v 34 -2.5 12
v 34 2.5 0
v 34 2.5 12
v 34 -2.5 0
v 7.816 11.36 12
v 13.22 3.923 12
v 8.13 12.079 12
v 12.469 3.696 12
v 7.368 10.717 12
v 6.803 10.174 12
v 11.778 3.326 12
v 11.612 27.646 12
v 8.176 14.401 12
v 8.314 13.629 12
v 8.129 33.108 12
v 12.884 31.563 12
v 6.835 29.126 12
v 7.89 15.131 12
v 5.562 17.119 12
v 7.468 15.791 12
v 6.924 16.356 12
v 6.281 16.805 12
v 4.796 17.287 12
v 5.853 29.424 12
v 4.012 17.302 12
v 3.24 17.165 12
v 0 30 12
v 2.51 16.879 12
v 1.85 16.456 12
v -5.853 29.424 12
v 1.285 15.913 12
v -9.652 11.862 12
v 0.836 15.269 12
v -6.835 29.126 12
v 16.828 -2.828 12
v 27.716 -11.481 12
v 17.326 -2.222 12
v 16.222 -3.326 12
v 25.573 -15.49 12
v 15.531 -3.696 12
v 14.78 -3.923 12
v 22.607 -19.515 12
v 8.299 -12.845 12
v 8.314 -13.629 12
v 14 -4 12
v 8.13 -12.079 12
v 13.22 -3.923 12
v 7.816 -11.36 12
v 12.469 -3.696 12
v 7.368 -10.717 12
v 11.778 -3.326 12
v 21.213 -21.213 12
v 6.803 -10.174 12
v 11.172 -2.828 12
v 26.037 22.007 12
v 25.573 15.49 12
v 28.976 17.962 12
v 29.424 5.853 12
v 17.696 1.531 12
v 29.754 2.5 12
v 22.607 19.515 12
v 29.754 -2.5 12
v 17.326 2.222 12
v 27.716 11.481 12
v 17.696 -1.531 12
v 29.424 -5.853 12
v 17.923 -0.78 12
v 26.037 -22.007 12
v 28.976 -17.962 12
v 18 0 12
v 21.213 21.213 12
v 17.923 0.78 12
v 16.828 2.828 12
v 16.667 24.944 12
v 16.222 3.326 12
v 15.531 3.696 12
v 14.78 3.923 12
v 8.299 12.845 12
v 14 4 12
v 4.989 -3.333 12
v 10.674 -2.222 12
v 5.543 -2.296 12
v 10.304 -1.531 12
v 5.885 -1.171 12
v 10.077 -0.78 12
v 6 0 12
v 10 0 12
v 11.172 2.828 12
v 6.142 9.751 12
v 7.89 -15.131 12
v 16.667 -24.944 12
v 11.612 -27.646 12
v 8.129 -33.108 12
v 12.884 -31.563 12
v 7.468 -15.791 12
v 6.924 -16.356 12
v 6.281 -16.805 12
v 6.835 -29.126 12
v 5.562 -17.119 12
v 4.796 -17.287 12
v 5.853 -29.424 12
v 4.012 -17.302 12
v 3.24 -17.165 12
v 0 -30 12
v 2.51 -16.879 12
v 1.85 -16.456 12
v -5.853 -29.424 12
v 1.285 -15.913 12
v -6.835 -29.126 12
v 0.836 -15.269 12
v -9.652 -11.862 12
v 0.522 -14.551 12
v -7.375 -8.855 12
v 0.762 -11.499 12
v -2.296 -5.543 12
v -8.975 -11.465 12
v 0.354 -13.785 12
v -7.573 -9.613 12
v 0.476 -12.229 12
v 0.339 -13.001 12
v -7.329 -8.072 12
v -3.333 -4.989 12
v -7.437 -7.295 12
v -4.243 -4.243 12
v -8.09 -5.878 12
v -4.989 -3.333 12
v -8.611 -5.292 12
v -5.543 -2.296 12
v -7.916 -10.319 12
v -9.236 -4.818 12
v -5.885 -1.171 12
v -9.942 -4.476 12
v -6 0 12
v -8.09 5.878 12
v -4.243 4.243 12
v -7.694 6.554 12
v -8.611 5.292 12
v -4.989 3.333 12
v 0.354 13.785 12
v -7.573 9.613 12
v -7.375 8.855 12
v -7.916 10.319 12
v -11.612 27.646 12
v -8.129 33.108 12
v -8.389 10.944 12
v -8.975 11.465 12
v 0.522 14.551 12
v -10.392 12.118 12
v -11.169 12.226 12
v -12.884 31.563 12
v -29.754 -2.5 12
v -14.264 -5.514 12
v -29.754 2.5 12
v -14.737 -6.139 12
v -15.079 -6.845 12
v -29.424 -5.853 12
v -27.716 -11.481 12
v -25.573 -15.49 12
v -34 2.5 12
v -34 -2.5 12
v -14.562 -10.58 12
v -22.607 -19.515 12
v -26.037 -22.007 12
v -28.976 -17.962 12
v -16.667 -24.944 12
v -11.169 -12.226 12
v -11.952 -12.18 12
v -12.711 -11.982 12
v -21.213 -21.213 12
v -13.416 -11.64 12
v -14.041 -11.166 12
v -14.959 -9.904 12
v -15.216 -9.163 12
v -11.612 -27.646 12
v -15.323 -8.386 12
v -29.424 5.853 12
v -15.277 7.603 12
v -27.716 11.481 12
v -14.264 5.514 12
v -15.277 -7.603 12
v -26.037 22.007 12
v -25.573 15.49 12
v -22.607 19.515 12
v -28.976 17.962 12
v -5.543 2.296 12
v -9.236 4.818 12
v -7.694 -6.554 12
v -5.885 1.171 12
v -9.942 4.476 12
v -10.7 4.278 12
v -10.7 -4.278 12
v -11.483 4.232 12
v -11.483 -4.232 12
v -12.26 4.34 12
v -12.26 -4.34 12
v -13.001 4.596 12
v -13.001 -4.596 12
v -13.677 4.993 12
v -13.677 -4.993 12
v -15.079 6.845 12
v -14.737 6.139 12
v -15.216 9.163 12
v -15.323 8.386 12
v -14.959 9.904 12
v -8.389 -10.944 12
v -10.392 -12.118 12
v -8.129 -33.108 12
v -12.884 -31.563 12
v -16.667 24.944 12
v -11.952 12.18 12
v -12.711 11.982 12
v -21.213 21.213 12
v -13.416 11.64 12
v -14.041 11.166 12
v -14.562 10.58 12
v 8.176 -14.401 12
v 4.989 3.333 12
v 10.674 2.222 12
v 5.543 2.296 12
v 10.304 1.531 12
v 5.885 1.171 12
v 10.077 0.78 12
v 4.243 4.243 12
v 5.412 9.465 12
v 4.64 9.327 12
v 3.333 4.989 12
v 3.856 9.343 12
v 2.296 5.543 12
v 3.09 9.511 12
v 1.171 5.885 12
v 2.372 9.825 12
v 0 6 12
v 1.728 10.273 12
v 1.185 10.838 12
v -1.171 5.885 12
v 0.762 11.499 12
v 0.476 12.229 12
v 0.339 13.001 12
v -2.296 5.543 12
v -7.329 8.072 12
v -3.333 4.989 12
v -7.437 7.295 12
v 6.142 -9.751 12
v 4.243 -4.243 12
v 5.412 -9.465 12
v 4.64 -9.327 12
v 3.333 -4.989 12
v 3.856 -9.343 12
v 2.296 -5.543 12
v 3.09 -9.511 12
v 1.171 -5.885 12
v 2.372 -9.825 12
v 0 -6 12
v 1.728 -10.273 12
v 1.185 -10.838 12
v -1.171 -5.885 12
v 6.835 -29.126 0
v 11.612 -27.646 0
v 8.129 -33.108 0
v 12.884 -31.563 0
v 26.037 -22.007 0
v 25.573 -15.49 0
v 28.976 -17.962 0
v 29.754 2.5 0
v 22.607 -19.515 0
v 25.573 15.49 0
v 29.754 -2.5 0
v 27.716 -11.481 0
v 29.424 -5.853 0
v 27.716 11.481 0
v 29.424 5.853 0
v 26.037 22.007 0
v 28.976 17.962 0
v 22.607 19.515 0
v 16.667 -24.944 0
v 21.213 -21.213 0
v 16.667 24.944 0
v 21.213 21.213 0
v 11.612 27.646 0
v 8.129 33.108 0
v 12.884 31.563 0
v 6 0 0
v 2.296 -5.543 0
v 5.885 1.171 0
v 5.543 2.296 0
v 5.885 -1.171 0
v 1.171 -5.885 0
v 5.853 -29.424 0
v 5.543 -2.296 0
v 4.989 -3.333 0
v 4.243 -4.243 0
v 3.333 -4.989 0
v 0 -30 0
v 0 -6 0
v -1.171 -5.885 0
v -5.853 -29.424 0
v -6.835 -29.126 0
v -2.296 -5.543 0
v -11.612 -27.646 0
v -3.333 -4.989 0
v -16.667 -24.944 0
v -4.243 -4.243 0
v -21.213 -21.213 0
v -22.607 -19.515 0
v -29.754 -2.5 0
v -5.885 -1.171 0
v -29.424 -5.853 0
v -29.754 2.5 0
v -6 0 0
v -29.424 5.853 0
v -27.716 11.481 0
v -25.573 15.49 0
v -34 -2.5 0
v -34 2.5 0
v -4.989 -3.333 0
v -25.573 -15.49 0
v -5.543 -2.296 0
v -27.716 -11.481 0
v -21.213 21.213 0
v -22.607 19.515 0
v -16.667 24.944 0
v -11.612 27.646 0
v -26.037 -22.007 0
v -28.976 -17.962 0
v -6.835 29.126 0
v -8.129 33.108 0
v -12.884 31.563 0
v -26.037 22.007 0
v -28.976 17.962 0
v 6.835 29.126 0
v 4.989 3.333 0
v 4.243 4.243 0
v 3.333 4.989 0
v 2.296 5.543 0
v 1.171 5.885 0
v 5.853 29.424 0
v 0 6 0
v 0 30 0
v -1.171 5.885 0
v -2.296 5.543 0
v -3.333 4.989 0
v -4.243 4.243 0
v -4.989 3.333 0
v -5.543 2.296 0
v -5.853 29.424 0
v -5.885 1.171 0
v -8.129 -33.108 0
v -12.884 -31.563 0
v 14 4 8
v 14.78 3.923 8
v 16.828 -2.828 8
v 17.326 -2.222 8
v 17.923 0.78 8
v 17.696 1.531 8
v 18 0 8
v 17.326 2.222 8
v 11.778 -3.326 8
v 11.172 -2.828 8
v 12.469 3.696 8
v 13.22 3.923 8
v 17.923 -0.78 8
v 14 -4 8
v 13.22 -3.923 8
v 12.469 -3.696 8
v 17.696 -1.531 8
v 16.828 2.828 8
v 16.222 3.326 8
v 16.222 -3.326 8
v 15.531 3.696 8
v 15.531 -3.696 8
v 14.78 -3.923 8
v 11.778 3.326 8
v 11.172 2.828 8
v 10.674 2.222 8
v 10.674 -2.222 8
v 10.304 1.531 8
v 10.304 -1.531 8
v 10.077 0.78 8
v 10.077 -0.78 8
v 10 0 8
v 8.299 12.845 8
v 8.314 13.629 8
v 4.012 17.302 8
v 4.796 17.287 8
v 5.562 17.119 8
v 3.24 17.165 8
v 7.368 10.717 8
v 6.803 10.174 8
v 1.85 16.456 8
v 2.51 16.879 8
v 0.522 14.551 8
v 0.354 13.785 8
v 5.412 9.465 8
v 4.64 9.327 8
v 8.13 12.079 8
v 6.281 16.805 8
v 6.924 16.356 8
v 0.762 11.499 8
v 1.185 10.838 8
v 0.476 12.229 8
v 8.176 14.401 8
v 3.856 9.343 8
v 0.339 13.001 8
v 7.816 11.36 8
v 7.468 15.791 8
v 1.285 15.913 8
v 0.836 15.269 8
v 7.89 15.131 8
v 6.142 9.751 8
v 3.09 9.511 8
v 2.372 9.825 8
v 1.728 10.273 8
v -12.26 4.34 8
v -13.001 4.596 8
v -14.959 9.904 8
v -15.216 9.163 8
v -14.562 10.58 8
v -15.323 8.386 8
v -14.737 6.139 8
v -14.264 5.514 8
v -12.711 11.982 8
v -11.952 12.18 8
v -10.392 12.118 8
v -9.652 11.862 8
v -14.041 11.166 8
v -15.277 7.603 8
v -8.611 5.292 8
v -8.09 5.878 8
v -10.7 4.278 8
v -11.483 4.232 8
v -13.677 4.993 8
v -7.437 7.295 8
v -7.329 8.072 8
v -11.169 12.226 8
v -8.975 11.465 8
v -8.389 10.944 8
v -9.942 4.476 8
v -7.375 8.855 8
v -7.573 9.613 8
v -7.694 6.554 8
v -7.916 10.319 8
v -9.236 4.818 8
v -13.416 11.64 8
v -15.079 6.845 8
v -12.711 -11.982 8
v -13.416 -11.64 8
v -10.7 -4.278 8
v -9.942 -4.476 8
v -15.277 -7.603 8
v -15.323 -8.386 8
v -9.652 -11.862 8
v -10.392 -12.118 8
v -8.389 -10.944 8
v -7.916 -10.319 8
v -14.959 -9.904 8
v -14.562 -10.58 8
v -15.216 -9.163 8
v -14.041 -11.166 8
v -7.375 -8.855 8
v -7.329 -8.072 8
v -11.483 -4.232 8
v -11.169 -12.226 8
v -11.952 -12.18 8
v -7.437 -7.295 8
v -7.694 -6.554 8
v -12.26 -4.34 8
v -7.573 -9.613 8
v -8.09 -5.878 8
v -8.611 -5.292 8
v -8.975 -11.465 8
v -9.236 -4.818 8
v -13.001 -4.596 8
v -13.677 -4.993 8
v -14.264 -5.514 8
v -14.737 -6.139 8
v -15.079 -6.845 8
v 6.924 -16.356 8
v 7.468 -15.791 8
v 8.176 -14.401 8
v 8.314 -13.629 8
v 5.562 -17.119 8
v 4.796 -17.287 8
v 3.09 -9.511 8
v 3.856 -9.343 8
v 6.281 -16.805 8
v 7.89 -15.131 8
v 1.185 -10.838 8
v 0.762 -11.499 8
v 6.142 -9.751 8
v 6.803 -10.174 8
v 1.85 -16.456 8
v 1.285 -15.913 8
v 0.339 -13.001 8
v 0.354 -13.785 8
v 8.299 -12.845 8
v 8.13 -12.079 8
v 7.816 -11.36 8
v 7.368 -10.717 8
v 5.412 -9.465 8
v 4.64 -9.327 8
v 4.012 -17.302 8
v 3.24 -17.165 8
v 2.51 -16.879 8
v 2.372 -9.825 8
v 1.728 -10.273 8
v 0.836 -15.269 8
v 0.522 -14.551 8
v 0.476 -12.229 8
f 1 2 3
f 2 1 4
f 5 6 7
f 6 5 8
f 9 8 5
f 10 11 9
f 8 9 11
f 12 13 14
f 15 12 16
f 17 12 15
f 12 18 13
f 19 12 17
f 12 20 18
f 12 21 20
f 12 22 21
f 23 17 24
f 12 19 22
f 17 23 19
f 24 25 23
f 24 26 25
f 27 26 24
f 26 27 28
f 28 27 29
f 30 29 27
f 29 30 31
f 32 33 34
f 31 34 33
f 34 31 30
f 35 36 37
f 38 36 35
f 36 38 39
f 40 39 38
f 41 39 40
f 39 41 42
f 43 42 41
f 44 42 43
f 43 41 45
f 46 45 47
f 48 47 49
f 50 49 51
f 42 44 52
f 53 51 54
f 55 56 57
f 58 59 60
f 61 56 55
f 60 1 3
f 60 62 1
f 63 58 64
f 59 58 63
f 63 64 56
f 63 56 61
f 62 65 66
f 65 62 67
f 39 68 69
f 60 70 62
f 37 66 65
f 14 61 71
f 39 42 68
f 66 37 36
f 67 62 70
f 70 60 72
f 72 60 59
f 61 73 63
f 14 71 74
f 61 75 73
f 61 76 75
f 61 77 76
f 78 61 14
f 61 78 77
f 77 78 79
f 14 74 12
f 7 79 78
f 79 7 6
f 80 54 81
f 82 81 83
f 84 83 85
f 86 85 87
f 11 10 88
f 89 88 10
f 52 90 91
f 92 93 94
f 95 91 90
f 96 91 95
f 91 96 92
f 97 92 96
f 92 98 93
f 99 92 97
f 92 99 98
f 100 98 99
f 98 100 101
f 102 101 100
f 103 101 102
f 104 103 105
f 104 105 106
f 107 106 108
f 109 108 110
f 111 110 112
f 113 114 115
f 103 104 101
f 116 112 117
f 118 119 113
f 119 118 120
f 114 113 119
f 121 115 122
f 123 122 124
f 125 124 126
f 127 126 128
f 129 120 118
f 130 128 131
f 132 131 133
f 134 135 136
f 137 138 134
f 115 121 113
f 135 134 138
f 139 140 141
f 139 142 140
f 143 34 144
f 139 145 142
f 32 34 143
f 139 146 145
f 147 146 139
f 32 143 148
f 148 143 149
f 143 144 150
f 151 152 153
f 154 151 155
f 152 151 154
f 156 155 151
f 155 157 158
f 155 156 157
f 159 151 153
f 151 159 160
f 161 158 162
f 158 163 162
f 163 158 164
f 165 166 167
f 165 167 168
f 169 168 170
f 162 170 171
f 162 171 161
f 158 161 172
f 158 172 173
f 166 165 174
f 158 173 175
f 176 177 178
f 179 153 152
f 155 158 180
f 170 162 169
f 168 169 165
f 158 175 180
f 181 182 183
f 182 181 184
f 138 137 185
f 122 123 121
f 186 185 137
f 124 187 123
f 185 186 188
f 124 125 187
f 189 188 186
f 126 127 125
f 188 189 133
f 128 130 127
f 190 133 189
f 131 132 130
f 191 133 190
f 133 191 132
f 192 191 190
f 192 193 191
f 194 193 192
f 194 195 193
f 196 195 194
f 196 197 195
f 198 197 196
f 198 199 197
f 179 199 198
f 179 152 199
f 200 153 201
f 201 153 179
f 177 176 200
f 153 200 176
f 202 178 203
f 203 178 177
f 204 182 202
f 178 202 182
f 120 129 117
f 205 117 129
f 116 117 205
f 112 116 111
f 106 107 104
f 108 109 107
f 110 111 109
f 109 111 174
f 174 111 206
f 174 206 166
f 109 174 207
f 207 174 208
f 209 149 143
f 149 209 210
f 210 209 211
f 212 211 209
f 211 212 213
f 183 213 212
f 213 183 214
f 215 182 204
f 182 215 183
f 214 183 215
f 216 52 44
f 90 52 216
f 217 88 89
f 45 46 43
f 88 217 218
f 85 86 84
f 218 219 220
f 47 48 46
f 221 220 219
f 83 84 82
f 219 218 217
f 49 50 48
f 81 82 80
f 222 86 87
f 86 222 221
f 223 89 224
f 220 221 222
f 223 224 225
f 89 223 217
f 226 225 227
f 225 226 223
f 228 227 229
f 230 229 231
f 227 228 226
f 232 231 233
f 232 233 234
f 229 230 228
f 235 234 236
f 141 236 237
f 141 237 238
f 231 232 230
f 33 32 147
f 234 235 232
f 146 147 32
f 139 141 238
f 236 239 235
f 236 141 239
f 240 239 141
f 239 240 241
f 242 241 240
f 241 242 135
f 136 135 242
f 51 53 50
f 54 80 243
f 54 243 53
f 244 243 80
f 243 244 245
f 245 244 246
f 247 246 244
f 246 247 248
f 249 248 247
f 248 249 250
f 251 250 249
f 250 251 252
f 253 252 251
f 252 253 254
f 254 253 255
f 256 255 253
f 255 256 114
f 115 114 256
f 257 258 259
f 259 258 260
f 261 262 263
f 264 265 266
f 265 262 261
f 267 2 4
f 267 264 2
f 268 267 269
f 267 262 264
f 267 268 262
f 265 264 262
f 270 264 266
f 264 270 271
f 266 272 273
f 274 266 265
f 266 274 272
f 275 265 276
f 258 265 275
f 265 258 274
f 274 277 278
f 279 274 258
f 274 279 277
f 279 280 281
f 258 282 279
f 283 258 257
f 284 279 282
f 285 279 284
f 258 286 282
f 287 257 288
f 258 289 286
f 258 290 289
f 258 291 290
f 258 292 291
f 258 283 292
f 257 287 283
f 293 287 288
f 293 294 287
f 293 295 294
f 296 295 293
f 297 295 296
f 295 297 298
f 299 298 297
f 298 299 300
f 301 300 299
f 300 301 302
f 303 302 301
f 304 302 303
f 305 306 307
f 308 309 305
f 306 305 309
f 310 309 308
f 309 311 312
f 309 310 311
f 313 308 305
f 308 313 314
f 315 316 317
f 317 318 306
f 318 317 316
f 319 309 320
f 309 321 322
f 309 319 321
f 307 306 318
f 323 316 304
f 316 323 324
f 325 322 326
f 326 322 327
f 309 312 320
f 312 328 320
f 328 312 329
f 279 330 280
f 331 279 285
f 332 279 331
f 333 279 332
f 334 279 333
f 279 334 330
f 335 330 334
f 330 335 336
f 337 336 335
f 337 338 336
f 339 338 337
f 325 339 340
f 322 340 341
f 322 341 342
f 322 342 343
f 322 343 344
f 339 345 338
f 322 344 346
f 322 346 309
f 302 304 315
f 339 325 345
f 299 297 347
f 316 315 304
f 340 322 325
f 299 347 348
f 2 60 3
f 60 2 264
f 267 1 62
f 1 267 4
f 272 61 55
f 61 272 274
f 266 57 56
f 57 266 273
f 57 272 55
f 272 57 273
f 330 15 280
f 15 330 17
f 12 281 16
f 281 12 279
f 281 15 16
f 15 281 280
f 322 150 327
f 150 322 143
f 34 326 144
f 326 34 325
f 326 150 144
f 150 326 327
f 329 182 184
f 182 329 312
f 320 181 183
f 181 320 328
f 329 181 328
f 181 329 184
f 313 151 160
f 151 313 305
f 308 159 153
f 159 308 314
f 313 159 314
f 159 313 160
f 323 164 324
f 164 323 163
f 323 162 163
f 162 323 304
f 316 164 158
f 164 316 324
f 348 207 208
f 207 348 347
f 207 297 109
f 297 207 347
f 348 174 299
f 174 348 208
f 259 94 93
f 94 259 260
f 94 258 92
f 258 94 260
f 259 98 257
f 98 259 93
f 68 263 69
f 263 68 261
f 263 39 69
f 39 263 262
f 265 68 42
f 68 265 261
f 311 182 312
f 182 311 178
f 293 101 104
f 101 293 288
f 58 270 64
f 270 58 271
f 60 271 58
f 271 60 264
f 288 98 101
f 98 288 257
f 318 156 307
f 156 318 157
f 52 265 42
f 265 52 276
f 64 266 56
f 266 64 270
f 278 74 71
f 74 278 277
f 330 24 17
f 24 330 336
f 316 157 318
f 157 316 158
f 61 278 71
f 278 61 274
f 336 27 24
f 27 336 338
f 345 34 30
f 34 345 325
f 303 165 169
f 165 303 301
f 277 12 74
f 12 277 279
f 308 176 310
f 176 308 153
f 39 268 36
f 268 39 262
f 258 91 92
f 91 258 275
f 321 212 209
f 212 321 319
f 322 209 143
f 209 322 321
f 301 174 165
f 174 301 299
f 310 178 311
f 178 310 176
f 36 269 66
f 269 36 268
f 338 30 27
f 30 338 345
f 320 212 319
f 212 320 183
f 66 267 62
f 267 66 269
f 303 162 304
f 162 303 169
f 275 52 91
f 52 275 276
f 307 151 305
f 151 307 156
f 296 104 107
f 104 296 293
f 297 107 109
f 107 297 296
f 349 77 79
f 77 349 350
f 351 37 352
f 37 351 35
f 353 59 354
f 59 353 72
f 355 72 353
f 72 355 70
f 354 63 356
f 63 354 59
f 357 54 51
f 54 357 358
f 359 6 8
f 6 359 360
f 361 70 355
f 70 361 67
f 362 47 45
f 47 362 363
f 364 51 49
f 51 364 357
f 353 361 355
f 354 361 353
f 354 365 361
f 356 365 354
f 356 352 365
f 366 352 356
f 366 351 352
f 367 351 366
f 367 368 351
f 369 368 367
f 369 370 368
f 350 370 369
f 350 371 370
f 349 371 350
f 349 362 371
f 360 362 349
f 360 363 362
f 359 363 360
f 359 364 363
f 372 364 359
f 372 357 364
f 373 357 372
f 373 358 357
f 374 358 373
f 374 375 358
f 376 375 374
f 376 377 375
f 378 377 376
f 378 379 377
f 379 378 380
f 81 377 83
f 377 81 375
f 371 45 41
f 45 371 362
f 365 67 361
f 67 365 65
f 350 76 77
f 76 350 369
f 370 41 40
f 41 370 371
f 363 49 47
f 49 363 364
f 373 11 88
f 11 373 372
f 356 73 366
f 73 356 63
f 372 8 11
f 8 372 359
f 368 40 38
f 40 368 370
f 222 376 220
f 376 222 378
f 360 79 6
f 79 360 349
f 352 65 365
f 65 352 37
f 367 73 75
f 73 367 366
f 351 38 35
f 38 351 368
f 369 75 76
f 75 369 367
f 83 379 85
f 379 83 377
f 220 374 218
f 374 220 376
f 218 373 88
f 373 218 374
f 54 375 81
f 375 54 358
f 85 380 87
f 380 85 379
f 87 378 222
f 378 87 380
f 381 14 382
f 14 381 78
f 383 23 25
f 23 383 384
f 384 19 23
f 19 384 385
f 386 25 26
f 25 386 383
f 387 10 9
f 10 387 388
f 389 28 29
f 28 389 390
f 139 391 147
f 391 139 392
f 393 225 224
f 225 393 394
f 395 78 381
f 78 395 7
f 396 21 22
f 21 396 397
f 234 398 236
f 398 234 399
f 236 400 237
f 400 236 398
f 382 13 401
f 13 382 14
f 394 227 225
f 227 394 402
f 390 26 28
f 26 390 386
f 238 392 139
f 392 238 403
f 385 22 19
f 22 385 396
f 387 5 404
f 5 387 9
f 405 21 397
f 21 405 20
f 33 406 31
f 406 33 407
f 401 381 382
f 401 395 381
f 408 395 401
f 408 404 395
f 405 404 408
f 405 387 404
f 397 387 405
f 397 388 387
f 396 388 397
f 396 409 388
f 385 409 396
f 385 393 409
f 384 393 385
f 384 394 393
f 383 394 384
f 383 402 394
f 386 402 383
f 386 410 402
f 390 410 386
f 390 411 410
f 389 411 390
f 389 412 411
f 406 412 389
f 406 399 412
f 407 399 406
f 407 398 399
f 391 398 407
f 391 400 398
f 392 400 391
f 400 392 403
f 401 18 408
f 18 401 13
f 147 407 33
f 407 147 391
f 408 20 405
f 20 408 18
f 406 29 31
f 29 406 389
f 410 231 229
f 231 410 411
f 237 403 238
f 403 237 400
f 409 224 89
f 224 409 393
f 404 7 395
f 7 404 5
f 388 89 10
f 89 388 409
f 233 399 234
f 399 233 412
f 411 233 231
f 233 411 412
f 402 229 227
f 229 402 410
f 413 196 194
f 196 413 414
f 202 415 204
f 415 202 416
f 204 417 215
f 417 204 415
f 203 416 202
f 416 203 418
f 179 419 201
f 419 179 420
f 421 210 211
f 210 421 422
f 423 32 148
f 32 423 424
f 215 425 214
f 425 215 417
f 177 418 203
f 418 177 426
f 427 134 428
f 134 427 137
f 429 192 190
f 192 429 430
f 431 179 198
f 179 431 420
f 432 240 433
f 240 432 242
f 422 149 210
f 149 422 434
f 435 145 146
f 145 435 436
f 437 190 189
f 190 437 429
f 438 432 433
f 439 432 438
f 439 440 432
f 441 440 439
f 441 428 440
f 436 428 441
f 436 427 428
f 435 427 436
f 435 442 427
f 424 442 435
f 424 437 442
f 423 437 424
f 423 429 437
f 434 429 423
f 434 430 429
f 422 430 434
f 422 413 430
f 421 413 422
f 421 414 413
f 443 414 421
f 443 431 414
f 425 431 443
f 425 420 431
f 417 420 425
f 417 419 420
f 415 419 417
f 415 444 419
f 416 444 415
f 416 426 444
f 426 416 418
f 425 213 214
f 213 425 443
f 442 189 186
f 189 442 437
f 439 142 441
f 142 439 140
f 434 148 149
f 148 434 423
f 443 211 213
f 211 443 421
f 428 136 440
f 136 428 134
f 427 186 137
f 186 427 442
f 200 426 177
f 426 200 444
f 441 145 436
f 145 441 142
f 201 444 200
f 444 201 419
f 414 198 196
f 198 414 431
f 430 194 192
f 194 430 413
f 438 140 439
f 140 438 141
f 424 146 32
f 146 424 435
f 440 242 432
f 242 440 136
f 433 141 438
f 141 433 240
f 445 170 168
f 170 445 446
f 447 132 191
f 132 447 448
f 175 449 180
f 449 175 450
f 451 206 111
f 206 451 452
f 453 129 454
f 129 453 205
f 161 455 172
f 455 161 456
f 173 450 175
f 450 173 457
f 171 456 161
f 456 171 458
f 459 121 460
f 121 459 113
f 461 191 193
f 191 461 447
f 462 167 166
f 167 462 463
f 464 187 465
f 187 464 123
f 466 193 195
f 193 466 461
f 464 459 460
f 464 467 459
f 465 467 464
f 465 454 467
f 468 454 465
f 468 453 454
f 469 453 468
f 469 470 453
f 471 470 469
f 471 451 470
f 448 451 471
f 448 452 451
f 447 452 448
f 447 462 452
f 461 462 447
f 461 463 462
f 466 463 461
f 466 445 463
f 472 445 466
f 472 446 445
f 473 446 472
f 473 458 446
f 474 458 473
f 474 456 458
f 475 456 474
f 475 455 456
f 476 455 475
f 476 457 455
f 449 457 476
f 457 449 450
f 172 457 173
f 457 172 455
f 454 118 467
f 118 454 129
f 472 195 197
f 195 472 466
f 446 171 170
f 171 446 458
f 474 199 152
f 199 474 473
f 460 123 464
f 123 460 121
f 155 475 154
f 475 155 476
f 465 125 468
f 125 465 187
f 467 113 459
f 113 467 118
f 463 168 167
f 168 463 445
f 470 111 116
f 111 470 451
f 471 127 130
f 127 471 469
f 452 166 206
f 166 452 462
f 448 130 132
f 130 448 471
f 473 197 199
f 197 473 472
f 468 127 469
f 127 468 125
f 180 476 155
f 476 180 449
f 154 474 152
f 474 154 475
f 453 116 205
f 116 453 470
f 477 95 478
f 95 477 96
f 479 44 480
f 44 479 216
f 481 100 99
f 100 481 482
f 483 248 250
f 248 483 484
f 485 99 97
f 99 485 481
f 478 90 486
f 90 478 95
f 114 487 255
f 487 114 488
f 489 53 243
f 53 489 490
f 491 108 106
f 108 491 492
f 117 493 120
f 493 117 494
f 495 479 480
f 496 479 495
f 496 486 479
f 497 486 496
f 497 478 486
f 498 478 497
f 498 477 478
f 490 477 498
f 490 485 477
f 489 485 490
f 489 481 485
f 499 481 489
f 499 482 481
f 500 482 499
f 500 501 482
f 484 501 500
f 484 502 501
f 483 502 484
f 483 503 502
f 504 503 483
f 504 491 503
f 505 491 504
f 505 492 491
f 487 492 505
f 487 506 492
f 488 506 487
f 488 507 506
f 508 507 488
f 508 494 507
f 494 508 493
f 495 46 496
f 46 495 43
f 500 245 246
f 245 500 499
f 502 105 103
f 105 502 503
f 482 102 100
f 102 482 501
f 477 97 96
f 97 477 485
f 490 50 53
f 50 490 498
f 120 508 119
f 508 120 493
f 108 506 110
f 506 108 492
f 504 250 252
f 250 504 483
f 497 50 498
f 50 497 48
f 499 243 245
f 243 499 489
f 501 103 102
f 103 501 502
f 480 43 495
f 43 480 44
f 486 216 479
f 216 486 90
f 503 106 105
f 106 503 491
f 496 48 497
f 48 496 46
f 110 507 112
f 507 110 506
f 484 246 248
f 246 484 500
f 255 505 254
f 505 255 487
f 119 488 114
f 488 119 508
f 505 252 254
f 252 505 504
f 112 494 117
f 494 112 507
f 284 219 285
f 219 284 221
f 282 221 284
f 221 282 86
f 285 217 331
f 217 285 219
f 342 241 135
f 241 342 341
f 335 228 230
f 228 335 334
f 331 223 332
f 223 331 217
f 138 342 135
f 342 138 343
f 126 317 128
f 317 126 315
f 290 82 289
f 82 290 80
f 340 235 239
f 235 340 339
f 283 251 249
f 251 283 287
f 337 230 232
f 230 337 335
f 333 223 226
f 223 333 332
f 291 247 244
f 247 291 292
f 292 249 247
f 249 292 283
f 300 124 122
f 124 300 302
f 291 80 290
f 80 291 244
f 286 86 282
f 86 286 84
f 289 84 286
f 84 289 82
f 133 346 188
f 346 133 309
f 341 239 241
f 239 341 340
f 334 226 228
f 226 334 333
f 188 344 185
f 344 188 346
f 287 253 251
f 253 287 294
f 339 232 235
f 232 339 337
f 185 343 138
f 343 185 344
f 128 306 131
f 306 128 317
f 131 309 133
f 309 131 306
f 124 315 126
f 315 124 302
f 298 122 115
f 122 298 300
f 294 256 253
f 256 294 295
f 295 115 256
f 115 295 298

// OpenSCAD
$fn = 32;

// ----------------------------------------------------------------------
// Spur blank: lightened gear blank
// ----------------------------------------------------------------------

// --- parameters (mm) ---
disc_r = 30;              // blank root radius
disc_t = 12;              // blank thickness
n_teeth = 10;             // stub tooth count
tooth_w = 5;              // tooth width at the root
tooth_h = 4;              // tooth height above the root
bore_r = 6;               // central bore radius
ring_r = 14;              // lightening pocket ring radius
pocket_r = 4;             // lightening pocket radius

out_r = disc_r + tooth_h;  // tip radius
bbox_x = 68.0;  // measured width over the teeth
bbox_y = 66.22;  // measured depth over the teeth

difference() {
union() {
  cylinder(r = disc_r, h = disc_t);
  for (i = [0 : n_teeth - 1])
    rotate([0, 0, i * 360 / n_teeth])
      translate([disc_r - 1, -tooth_w / 2, 0])
        cube([tooth_h + 1, tooth_w, disc_t]);
}
  translate([0, 0, -1]) cylinder(r = bore_r, h = disc_t + 2);
  for (i = [0 : 5])
    rotate([0, 0, i * 72])
      translate([ring_r, 0, disc_t - 4])
        cylinder(r = pocket_r, h = 5);
}
